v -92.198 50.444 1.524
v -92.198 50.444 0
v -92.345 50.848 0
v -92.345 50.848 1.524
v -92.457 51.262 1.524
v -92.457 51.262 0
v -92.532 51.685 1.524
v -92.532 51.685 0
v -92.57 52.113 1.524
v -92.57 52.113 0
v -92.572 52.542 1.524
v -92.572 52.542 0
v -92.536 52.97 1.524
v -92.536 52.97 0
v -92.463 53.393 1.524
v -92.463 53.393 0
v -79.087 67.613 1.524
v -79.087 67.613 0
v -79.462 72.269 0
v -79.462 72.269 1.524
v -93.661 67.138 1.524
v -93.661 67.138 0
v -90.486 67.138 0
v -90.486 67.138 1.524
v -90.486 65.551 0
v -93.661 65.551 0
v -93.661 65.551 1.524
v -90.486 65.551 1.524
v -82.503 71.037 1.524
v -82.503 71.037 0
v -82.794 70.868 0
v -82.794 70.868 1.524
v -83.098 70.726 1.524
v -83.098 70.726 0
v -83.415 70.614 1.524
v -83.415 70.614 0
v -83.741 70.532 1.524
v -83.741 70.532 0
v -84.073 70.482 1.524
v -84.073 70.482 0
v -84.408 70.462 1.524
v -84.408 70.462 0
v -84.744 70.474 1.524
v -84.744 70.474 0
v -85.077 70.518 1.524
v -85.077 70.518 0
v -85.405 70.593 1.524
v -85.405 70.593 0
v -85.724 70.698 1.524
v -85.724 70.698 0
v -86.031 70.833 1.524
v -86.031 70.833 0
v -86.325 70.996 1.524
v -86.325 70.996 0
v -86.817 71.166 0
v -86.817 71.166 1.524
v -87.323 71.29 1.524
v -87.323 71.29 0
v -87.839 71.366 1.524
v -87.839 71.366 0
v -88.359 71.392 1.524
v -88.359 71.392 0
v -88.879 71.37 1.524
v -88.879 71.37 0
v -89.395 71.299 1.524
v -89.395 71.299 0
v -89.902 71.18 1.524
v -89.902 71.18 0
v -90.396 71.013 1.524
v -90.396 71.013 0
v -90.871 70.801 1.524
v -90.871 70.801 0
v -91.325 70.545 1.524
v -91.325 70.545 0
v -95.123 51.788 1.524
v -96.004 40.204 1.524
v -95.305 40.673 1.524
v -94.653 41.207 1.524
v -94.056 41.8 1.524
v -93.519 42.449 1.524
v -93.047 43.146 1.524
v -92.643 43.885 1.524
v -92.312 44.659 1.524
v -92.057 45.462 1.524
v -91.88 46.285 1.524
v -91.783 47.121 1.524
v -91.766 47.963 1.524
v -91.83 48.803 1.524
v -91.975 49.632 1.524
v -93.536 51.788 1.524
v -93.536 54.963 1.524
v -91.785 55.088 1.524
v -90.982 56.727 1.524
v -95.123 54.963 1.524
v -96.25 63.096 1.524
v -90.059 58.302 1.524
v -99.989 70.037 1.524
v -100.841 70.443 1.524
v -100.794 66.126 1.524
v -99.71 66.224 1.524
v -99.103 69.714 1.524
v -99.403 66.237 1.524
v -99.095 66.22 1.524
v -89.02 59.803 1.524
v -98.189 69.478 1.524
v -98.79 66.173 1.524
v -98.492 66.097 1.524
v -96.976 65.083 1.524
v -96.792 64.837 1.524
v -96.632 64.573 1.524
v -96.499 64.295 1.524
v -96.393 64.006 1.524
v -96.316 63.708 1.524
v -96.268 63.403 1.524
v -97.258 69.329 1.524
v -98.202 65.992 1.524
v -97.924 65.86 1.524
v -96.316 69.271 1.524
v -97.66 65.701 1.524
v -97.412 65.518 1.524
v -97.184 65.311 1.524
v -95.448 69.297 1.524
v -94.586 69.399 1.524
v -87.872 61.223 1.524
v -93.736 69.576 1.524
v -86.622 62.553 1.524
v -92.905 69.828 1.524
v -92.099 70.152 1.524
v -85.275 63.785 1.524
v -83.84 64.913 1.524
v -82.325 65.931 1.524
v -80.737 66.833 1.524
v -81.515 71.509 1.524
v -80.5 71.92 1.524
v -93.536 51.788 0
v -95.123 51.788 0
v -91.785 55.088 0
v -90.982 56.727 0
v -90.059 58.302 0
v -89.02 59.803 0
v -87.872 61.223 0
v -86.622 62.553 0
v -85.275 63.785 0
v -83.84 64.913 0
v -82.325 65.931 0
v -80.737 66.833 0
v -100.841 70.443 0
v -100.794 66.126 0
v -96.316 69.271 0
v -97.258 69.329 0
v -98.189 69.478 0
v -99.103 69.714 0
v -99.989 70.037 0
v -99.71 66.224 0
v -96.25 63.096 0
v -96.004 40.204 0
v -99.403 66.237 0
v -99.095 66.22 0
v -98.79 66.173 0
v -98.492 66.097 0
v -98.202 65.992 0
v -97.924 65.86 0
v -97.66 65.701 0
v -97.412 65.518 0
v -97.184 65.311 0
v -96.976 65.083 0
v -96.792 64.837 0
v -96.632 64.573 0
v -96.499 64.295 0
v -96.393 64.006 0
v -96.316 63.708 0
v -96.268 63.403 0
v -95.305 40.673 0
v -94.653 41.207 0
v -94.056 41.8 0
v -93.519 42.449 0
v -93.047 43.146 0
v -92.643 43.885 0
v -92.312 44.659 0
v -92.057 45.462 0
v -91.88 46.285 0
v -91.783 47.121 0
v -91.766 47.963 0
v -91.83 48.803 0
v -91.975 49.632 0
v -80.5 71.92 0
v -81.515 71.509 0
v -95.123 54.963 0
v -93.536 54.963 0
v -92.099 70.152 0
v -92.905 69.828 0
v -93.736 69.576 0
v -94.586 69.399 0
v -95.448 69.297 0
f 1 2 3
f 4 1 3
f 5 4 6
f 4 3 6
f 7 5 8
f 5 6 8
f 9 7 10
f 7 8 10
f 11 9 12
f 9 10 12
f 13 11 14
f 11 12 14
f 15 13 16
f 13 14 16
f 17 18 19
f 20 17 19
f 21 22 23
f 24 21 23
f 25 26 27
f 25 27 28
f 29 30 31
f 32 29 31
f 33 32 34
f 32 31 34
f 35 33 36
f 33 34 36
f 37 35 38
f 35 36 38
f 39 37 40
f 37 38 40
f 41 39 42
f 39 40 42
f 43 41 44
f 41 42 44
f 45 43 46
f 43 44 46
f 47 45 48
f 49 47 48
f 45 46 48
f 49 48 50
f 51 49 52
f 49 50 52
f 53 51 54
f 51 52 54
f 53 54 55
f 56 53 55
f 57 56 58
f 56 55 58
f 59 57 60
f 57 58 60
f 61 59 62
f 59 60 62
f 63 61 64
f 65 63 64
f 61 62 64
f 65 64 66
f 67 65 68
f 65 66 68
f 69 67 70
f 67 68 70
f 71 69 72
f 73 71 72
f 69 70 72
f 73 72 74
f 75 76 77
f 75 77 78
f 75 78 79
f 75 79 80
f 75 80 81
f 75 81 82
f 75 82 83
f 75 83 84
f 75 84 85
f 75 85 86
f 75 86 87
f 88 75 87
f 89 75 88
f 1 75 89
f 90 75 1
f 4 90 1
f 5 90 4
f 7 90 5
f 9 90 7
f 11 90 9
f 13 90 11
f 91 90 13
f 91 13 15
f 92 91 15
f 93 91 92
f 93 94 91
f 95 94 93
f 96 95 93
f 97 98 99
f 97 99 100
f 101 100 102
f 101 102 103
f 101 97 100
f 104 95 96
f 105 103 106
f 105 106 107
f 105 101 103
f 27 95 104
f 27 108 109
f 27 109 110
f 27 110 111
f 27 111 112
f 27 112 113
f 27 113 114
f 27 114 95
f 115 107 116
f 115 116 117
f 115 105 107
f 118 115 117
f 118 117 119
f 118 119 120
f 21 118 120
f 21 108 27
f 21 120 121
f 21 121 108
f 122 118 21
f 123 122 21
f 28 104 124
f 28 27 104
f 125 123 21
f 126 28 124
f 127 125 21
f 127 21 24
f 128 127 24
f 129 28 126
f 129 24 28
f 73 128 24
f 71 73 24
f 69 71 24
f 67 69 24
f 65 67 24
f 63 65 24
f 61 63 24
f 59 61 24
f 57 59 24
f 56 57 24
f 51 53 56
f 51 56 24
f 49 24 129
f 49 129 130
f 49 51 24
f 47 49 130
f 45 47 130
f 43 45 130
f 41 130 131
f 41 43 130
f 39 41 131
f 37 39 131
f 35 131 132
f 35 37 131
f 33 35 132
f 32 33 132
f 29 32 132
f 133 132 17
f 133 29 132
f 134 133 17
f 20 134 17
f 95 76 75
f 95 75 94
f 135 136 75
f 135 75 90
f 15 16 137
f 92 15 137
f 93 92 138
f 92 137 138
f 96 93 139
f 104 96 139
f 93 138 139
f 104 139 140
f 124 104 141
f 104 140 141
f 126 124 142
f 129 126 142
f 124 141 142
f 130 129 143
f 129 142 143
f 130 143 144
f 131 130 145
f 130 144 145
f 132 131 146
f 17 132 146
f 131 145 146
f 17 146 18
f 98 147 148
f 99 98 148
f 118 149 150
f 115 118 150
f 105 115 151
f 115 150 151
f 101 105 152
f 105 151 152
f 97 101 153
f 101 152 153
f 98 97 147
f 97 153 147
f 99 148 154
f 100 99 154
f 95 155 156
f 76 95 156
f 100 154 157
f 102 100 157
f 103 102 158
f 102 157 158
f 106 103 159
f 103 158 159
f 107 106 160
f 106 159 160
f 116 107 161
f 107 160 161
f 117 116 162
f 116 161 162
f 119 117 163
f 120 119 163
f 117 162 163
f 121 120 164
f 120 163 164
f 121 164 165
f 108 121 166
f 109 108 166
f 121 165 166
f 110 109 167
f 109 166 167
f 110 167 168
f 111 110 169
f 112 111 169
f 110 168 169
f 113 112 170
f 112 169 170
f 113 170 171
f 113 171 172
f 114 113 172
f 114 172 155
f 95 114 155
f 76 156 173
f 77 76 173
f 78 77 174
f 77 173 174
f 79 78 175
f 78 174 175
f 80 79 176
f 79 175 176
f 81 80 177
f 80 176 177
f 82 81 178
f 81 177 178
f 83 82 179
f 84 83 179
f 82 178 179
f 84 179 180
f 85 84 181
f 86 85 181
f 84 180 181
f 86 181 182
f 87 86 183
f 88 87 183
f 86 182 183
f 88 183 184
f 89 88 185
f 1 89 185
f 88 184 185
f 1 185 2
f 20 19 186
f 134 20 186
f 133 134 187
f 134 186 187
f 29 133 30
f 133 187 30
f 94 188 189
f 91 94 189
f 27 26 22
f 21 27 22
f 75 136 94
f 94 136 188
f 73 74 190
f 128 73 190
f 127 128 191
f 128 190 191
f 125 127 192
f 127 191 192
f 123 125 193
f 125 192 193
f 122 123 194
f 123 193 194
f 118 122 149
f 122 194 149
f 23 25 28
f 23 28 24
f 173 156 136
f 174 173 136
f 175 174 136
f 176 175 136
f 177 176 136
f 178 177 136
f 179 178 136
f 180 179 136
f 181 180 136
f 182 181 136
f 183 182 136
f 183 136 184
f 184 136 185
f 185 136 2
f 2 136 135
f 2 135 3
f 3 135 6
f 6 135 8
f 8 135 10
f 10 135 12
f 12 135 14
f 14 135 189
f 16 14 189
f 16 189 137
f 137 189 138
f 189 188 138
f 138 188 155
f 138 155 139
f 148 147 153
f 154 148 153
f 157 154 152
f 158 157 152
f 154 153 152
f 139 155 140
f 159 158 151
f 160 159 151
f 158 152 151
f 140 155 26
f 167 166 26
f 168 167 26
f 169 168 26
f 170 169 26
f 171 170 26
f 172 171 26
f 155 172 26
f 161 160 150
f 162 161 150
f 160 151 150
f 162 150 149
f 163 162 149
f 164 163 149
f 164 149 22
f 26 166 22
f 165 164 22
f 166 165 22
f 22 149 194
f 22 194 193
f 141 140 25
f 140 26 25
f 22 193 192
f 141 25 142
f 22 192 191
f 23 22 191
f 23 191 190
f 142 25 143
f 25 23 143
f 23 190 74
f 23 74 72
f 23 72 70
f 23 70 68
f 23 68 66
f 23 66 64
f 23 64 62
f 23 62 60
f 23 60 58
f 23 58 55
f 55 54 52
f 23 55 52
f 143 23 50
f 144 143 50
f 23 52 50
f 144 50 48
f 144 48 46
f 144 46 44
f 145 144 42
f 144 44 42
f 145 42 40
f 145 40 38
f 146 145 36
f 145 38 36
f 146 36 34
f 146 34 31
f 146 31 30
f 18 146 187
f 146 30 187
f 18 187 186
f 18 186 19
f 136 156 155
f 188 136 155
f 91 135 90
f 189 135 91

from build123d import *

# Parameters (mm, degrees)
SKETCH1_W           = 1.5875
SKETCH1_H           = 3.175
SKETCH1_W_2         = 3.175
SKETCH1_H_2         = 1.5875
BOSS_EXTRUDE1_DEPTH = 1.524


with BuildPart() as part:
    # Sketch1 → Boss-Extrude1 (new body)
    with BuildSketch(Plane.XY):
        with BuildLine():
            ThreePointArc((-92.462594244, 53.392882958), (-87.259455285, 61.89953001), (-79.086960783, 67.613200697))
            Line((-79.086960783, 67.613200697), (-79.461877647, 72.269382522))
            ThreePointArc((-79.461877647, 72.269382522), (-81.010669369, 71.722343201), (-82.50335439, 71.03685123))
            ThreePointArc((-82.50335439, 71.03685123), (-84.40835406, 70.46229139), (-86.325241021, 70.995852197))
            ThreePointArc((-86.325241021, 70.995852197), (-88.879114534, 71.369944183), (-91.324996548, 70.545398299))
            ThreePointArc((-91.324996548, 70.545398299), (-93.73568856, 69.57630413), (-96.315834525, 69.270646985))
            ThreePointArc((-96.315834525, 69.270646985), (-98.648749132, 69.584935579), (-100.840653449, 70.443319727))
            Line((-100.840653449, 70.443319727), (-100.794339098, 66.125944717))
            Line((-100.794339098, 66.125944717), (-99.710350028, 66.223965922))
            ThreePointArc((-99.710350028, 66.223965922), (-97.295430394, 65.417299389), (-96.249595613, 63.095925369))
            Line((-96.249595613, 63.095925369), (-96.004020182, 40.203642412))
            ThreePointArc((-96.004020182, 40.203642412), (-92.311993967, 44.659081136), (-92.198099781, 50.444322695))
            ThreePointArc((-92.198099781, 50.444322695), (-92.555911633, 51.898369022), (-92.462594244, 53.392882958))
        make_face()
        with Locations((-94.329440184, 53.37562941)):
            Rectangle(SKETCH1_W, SKETCH1_H, mode=Mode.SUBTRACT)
        with Locations((-92.073197515, 66.344715332)):
            Rectangle(SKETCH1_W_2, SKETCH1_H_2, mode=Mode.SUBTRACT)
    extrude(amount=BOSS_EXTRUDE1_DEPTH)


solid = part.part
